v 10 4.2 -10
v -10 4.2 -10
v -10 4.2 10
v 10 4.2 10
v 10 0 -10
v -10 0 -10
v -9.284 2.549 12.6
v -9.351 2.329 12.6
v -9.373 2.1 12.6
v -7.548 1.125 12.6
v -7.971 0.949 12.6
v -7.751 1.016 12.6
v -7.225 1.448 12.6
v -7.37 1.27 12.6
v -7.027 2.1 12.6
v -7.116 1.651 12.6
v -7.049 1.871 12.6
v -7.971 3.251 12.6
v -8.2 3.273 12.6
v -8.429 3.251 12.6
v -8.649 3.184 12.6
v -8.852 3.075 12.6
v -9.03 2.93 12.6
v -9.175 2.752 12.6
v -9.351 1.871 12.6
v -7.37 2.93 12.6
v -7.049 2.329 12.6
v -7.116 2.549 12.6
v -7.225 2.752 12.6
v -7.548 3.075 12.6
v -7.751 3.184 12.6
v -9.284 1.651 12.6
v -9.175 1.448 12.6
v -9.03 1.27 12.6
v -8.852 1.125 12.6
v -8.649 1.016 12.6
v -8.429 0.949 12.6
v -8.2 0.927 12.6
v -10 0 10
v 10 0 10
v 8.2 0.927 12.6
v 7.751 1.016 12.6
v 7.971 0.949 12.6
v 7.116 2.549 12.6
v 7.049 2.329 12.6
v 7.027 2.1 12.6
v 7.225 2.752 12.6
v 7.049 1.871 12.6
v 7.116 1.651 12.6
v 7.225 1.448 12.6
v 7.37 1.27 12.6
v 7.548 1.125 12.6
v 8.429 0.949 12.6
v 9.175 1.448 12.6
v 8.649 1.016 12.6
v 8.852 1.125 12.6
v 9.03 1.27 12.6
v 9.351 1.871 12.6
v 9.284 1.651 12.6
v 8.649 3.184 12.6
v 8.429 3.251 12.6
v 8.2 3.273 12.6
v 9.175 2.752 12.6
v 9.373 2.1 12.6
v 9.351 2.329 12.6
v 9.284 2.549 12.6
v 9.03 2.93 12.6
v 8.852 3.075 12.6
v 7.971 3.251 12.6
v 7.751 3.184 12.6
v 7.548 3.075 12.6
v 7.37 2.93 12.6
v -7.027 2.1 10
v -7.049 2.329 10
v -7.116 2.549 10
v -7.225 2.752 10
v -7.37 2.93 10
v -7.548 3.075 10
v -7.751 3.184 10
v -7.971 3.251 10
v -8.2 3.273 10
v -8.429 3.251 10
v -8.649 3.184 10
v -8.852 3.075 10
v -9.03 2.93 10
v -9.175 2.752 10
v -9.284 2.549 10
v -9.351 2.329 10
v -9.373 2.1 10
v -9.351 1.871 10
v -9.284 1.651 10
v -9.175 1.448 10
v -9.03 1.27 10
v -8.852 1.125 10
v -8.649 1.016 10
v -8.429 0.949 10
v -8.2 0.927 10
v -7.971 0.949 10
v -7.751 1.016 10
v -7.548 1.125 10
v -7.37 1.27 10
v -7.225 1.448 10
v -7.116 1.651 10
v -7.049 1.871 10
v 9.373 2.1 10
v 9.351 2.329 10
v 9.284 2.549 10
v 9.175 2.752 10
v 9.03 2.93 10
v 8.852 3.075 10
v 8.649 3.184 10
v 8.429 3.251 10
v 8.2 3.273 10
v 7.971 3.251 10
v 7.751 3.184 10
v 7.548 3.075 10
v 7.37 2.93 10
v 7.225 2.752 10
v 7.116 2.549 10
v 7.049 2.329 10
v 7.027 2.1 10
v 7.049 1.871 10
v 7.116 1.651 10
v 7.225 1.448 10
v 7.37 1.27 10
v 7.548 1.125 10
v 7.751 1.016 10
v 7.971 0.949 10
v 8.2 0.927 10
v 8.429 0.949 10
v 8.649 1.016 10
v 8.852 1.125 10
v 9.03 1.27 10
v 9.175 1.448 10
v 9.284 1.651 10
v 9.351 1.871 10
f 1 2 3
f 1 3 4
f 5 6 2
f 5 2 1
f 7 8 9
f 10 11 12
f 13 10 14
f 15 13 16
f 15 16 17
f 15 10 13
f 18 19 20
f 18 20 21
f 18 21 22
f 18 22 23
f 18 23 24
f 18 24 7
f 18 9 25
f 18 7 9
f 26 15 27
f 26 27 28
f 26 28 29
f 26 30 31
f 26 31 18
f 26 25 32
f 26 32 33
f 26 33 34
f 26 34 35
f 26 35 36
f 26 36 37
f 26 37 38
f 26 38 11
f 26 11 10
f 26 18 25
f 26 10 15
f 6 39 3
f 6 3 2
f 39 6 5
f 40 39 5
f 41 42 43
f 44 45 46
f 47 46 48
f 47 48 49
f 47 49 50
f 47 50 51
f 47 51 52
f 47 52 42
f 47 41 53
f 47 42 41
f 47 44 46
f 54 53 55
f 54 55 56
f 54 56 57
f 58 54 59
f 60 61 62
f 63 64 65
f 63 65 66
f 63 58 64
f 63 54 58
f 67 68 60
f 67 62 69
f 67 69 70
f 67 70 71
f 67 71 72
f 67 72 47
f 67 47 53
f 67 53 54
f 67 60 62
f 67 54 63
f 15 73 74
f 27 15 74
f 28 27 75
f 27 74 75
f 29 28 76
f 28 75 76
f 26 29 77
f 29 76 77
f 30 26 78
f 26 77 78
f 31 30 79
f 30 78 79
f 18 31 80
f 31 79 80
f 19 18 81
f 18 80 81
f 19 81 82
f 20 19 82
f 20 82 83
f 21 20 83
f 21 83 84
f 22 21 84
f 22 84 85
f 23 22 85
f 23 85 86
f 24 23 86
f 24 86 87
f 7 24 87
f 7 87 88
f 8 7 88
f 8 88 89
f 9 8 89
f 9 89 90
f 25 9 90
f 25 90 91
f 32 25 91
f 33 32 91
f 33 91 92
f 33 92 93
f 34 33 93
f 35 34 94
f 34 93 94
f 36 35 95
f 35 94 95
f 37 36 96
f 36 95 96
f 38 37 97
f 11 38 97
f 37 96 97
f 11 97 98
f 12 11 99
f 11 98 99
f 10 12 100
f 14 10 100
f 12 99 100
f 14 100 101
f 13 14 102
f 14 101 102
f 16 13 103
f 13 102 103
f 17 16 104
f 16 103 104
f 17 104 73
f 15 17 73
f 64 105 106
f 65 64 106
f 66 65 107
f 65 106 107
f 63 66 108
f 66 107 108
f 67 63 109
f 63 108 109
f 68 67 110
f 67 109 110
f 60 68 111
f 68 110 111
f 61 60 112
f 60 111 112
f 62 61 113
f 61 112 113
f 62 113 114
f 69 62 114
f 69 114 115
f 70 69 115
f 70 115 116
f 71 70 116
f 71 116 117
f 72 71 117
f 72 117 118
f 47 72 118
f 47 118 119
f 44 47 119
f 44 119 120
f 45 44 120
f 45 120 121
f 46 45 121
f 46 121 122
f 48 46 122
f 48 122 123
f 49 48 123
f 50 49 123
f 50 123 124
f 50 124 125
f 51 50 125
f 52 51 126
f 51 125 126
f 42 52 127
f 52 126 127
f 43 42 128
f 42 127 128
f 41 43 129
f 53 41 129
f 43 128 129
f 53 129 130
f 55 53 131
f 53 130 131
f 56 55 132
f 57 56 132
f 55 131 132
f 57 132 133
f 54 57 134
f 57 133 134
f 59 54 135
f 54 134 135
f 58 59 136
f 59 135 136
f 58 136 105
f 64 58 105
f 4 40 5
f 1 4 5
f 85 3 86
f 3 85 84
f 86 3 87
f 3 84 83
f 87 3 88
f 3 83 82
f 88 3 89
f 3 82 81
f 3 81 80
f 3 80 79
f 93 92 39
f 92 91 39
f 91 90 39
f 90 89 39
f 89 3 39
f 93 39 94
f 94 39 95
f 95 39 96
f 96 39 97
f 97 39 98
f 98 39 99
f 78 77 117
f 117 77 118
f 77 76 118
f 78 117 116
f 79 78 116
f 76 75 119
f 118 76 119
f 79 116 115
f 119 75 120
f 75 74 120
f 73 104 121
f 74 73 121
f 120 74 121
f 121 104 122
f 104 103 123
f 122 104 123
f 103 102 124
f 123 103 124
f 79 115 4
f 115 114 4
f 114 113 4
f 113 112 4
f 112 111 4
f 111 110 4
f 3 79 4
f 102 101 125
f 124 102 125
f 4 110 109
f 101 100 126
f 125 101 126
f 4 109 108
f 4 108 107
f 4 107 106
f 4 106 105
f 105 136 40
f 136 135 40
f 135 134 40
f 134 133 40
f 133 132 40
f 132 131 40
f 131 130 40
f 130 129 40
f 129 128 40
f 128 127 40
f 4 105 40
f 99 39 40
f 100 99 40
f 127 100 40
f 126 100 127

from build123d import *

# Parameters (mm, degrees)
SKETCH_1_W      = 20
SKETCH_1_H      = 20
EXTRUDE_1_DEPTH = 4.2
SKETCH_2_R      = 1.173131764
EXTRUDE_2_DEPTH = 12.6


with BuildPart() as part:
    # 草图1 → 凸台-拉伸1 (new body)
    with BuildSketch(Plane(origin=(0, 0, 0), x_dir=(1, 0, 0), z_dir=(0, 1, 0))):
        Rectangle(SKETCH_1_W, SKETCH_1_H)
    extrude(amount=EXTRUDE_1_DEPTH)

    # 草图2 → 凸台-拉伸2 (add)
    with BuildSketch(Plane.XY):
        with Locations((-8.2, 2.1)):
            Circle(SKETCH_2_R)
        with Locations((8.2, 2.1)):
            Circle(SKETCH_2_R)
    extrude(amount=EXTRUDE_2_DEPTH)


solid = part.part
